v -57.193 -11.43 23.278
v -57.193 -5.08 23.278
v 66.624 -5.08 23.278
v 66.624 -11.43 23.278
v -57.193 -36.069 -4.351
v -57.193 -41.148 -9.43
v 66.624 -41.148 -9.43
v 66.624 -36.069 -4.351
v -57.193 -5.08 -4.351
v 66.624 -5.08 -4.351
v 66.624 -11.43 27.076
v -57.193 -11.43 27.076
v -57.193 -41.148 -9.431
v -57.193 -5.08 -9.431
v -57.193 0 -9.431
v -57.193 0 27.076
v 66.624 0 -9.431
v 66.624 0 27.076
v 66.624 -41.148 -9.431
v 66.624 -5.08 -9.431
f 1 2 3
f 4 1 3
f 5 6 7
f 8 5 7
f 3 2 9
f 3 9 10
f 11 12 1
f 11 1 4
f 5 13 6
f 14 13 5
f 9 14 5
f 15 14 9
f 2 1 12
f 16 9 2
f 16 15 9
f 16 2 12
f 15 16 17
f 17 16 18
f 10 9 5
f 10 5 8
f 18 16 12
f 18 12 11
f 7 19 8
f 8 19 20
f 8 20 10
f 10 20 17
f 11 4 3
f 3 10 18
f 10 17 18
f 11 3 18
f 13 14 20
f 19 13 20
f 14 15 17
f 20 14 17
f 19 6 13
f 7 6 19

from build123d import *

# Parameters (mm, degrees)
F0_W     = 123.8177604973
F0_H     = 36.5064647049
F1_DEPTH = 5.08
F2_DEPTH = 4.826
F3_W     = 123.8177604973
F3_H     = 3.7974044681
F4_DEPTH = 6.35
F5_W     = 123.8177604973
F5_H     = 5.0793443806
F6_DEPTH = 36.068
F7_SIZE  = 5.079


# Not quite as in the source:
# - a fillet or chamfer is up to 0.001 mm smaller than in the source, because OpenCascade refuses the exact size


with BuildPart() as f1:
    # F0 (on Front) → F1 (new body)
    with BuildSketch(Plane.XZ):
        with Locations((4.7154184431, 8.8223954663)):
            Rectangle(F0_W, F0_H)
    extrude(amount=F1_DEPTH)

    # F0 (on Front) → F2 (join)
    with BuildSketch(Plane.XZ):
        with Locations((4.7154184431, 8.8223954663)):
            Rectangle(F0_W, F0_H)
    extrude(amount=F2_DEPTH)

    # F3 (on face) → F4 (join)
    with BuildSketch(Plane.XZ.offset(5.08)):
        with Locations((4.7154184431, 25.1769255847)):
            Rectangle(F3_W, F3_H)
    extrude(amount=F4_DEPTH)

    # F5 (on face) → F6 (join)
    with BuildSketch(Plane.XZ.offset(5.08)):
        with Locations((4.7154184431, -6.8911646958)):
            Rectangle(F5_W, F5_H)
    extrude(amount=F6_DEPTH)

    # F7 (size 5.08 in the source; OpenCascade refuses exactly that, so slightly less here)
    f7_edges = [f1.edges().sort_by_distance(p)[0] for p in [
        (4.715418, -41.148, -4.351493),
    ]]
    chamfer(f7_edges, length=F7_SIZE)


solid = f1.part
